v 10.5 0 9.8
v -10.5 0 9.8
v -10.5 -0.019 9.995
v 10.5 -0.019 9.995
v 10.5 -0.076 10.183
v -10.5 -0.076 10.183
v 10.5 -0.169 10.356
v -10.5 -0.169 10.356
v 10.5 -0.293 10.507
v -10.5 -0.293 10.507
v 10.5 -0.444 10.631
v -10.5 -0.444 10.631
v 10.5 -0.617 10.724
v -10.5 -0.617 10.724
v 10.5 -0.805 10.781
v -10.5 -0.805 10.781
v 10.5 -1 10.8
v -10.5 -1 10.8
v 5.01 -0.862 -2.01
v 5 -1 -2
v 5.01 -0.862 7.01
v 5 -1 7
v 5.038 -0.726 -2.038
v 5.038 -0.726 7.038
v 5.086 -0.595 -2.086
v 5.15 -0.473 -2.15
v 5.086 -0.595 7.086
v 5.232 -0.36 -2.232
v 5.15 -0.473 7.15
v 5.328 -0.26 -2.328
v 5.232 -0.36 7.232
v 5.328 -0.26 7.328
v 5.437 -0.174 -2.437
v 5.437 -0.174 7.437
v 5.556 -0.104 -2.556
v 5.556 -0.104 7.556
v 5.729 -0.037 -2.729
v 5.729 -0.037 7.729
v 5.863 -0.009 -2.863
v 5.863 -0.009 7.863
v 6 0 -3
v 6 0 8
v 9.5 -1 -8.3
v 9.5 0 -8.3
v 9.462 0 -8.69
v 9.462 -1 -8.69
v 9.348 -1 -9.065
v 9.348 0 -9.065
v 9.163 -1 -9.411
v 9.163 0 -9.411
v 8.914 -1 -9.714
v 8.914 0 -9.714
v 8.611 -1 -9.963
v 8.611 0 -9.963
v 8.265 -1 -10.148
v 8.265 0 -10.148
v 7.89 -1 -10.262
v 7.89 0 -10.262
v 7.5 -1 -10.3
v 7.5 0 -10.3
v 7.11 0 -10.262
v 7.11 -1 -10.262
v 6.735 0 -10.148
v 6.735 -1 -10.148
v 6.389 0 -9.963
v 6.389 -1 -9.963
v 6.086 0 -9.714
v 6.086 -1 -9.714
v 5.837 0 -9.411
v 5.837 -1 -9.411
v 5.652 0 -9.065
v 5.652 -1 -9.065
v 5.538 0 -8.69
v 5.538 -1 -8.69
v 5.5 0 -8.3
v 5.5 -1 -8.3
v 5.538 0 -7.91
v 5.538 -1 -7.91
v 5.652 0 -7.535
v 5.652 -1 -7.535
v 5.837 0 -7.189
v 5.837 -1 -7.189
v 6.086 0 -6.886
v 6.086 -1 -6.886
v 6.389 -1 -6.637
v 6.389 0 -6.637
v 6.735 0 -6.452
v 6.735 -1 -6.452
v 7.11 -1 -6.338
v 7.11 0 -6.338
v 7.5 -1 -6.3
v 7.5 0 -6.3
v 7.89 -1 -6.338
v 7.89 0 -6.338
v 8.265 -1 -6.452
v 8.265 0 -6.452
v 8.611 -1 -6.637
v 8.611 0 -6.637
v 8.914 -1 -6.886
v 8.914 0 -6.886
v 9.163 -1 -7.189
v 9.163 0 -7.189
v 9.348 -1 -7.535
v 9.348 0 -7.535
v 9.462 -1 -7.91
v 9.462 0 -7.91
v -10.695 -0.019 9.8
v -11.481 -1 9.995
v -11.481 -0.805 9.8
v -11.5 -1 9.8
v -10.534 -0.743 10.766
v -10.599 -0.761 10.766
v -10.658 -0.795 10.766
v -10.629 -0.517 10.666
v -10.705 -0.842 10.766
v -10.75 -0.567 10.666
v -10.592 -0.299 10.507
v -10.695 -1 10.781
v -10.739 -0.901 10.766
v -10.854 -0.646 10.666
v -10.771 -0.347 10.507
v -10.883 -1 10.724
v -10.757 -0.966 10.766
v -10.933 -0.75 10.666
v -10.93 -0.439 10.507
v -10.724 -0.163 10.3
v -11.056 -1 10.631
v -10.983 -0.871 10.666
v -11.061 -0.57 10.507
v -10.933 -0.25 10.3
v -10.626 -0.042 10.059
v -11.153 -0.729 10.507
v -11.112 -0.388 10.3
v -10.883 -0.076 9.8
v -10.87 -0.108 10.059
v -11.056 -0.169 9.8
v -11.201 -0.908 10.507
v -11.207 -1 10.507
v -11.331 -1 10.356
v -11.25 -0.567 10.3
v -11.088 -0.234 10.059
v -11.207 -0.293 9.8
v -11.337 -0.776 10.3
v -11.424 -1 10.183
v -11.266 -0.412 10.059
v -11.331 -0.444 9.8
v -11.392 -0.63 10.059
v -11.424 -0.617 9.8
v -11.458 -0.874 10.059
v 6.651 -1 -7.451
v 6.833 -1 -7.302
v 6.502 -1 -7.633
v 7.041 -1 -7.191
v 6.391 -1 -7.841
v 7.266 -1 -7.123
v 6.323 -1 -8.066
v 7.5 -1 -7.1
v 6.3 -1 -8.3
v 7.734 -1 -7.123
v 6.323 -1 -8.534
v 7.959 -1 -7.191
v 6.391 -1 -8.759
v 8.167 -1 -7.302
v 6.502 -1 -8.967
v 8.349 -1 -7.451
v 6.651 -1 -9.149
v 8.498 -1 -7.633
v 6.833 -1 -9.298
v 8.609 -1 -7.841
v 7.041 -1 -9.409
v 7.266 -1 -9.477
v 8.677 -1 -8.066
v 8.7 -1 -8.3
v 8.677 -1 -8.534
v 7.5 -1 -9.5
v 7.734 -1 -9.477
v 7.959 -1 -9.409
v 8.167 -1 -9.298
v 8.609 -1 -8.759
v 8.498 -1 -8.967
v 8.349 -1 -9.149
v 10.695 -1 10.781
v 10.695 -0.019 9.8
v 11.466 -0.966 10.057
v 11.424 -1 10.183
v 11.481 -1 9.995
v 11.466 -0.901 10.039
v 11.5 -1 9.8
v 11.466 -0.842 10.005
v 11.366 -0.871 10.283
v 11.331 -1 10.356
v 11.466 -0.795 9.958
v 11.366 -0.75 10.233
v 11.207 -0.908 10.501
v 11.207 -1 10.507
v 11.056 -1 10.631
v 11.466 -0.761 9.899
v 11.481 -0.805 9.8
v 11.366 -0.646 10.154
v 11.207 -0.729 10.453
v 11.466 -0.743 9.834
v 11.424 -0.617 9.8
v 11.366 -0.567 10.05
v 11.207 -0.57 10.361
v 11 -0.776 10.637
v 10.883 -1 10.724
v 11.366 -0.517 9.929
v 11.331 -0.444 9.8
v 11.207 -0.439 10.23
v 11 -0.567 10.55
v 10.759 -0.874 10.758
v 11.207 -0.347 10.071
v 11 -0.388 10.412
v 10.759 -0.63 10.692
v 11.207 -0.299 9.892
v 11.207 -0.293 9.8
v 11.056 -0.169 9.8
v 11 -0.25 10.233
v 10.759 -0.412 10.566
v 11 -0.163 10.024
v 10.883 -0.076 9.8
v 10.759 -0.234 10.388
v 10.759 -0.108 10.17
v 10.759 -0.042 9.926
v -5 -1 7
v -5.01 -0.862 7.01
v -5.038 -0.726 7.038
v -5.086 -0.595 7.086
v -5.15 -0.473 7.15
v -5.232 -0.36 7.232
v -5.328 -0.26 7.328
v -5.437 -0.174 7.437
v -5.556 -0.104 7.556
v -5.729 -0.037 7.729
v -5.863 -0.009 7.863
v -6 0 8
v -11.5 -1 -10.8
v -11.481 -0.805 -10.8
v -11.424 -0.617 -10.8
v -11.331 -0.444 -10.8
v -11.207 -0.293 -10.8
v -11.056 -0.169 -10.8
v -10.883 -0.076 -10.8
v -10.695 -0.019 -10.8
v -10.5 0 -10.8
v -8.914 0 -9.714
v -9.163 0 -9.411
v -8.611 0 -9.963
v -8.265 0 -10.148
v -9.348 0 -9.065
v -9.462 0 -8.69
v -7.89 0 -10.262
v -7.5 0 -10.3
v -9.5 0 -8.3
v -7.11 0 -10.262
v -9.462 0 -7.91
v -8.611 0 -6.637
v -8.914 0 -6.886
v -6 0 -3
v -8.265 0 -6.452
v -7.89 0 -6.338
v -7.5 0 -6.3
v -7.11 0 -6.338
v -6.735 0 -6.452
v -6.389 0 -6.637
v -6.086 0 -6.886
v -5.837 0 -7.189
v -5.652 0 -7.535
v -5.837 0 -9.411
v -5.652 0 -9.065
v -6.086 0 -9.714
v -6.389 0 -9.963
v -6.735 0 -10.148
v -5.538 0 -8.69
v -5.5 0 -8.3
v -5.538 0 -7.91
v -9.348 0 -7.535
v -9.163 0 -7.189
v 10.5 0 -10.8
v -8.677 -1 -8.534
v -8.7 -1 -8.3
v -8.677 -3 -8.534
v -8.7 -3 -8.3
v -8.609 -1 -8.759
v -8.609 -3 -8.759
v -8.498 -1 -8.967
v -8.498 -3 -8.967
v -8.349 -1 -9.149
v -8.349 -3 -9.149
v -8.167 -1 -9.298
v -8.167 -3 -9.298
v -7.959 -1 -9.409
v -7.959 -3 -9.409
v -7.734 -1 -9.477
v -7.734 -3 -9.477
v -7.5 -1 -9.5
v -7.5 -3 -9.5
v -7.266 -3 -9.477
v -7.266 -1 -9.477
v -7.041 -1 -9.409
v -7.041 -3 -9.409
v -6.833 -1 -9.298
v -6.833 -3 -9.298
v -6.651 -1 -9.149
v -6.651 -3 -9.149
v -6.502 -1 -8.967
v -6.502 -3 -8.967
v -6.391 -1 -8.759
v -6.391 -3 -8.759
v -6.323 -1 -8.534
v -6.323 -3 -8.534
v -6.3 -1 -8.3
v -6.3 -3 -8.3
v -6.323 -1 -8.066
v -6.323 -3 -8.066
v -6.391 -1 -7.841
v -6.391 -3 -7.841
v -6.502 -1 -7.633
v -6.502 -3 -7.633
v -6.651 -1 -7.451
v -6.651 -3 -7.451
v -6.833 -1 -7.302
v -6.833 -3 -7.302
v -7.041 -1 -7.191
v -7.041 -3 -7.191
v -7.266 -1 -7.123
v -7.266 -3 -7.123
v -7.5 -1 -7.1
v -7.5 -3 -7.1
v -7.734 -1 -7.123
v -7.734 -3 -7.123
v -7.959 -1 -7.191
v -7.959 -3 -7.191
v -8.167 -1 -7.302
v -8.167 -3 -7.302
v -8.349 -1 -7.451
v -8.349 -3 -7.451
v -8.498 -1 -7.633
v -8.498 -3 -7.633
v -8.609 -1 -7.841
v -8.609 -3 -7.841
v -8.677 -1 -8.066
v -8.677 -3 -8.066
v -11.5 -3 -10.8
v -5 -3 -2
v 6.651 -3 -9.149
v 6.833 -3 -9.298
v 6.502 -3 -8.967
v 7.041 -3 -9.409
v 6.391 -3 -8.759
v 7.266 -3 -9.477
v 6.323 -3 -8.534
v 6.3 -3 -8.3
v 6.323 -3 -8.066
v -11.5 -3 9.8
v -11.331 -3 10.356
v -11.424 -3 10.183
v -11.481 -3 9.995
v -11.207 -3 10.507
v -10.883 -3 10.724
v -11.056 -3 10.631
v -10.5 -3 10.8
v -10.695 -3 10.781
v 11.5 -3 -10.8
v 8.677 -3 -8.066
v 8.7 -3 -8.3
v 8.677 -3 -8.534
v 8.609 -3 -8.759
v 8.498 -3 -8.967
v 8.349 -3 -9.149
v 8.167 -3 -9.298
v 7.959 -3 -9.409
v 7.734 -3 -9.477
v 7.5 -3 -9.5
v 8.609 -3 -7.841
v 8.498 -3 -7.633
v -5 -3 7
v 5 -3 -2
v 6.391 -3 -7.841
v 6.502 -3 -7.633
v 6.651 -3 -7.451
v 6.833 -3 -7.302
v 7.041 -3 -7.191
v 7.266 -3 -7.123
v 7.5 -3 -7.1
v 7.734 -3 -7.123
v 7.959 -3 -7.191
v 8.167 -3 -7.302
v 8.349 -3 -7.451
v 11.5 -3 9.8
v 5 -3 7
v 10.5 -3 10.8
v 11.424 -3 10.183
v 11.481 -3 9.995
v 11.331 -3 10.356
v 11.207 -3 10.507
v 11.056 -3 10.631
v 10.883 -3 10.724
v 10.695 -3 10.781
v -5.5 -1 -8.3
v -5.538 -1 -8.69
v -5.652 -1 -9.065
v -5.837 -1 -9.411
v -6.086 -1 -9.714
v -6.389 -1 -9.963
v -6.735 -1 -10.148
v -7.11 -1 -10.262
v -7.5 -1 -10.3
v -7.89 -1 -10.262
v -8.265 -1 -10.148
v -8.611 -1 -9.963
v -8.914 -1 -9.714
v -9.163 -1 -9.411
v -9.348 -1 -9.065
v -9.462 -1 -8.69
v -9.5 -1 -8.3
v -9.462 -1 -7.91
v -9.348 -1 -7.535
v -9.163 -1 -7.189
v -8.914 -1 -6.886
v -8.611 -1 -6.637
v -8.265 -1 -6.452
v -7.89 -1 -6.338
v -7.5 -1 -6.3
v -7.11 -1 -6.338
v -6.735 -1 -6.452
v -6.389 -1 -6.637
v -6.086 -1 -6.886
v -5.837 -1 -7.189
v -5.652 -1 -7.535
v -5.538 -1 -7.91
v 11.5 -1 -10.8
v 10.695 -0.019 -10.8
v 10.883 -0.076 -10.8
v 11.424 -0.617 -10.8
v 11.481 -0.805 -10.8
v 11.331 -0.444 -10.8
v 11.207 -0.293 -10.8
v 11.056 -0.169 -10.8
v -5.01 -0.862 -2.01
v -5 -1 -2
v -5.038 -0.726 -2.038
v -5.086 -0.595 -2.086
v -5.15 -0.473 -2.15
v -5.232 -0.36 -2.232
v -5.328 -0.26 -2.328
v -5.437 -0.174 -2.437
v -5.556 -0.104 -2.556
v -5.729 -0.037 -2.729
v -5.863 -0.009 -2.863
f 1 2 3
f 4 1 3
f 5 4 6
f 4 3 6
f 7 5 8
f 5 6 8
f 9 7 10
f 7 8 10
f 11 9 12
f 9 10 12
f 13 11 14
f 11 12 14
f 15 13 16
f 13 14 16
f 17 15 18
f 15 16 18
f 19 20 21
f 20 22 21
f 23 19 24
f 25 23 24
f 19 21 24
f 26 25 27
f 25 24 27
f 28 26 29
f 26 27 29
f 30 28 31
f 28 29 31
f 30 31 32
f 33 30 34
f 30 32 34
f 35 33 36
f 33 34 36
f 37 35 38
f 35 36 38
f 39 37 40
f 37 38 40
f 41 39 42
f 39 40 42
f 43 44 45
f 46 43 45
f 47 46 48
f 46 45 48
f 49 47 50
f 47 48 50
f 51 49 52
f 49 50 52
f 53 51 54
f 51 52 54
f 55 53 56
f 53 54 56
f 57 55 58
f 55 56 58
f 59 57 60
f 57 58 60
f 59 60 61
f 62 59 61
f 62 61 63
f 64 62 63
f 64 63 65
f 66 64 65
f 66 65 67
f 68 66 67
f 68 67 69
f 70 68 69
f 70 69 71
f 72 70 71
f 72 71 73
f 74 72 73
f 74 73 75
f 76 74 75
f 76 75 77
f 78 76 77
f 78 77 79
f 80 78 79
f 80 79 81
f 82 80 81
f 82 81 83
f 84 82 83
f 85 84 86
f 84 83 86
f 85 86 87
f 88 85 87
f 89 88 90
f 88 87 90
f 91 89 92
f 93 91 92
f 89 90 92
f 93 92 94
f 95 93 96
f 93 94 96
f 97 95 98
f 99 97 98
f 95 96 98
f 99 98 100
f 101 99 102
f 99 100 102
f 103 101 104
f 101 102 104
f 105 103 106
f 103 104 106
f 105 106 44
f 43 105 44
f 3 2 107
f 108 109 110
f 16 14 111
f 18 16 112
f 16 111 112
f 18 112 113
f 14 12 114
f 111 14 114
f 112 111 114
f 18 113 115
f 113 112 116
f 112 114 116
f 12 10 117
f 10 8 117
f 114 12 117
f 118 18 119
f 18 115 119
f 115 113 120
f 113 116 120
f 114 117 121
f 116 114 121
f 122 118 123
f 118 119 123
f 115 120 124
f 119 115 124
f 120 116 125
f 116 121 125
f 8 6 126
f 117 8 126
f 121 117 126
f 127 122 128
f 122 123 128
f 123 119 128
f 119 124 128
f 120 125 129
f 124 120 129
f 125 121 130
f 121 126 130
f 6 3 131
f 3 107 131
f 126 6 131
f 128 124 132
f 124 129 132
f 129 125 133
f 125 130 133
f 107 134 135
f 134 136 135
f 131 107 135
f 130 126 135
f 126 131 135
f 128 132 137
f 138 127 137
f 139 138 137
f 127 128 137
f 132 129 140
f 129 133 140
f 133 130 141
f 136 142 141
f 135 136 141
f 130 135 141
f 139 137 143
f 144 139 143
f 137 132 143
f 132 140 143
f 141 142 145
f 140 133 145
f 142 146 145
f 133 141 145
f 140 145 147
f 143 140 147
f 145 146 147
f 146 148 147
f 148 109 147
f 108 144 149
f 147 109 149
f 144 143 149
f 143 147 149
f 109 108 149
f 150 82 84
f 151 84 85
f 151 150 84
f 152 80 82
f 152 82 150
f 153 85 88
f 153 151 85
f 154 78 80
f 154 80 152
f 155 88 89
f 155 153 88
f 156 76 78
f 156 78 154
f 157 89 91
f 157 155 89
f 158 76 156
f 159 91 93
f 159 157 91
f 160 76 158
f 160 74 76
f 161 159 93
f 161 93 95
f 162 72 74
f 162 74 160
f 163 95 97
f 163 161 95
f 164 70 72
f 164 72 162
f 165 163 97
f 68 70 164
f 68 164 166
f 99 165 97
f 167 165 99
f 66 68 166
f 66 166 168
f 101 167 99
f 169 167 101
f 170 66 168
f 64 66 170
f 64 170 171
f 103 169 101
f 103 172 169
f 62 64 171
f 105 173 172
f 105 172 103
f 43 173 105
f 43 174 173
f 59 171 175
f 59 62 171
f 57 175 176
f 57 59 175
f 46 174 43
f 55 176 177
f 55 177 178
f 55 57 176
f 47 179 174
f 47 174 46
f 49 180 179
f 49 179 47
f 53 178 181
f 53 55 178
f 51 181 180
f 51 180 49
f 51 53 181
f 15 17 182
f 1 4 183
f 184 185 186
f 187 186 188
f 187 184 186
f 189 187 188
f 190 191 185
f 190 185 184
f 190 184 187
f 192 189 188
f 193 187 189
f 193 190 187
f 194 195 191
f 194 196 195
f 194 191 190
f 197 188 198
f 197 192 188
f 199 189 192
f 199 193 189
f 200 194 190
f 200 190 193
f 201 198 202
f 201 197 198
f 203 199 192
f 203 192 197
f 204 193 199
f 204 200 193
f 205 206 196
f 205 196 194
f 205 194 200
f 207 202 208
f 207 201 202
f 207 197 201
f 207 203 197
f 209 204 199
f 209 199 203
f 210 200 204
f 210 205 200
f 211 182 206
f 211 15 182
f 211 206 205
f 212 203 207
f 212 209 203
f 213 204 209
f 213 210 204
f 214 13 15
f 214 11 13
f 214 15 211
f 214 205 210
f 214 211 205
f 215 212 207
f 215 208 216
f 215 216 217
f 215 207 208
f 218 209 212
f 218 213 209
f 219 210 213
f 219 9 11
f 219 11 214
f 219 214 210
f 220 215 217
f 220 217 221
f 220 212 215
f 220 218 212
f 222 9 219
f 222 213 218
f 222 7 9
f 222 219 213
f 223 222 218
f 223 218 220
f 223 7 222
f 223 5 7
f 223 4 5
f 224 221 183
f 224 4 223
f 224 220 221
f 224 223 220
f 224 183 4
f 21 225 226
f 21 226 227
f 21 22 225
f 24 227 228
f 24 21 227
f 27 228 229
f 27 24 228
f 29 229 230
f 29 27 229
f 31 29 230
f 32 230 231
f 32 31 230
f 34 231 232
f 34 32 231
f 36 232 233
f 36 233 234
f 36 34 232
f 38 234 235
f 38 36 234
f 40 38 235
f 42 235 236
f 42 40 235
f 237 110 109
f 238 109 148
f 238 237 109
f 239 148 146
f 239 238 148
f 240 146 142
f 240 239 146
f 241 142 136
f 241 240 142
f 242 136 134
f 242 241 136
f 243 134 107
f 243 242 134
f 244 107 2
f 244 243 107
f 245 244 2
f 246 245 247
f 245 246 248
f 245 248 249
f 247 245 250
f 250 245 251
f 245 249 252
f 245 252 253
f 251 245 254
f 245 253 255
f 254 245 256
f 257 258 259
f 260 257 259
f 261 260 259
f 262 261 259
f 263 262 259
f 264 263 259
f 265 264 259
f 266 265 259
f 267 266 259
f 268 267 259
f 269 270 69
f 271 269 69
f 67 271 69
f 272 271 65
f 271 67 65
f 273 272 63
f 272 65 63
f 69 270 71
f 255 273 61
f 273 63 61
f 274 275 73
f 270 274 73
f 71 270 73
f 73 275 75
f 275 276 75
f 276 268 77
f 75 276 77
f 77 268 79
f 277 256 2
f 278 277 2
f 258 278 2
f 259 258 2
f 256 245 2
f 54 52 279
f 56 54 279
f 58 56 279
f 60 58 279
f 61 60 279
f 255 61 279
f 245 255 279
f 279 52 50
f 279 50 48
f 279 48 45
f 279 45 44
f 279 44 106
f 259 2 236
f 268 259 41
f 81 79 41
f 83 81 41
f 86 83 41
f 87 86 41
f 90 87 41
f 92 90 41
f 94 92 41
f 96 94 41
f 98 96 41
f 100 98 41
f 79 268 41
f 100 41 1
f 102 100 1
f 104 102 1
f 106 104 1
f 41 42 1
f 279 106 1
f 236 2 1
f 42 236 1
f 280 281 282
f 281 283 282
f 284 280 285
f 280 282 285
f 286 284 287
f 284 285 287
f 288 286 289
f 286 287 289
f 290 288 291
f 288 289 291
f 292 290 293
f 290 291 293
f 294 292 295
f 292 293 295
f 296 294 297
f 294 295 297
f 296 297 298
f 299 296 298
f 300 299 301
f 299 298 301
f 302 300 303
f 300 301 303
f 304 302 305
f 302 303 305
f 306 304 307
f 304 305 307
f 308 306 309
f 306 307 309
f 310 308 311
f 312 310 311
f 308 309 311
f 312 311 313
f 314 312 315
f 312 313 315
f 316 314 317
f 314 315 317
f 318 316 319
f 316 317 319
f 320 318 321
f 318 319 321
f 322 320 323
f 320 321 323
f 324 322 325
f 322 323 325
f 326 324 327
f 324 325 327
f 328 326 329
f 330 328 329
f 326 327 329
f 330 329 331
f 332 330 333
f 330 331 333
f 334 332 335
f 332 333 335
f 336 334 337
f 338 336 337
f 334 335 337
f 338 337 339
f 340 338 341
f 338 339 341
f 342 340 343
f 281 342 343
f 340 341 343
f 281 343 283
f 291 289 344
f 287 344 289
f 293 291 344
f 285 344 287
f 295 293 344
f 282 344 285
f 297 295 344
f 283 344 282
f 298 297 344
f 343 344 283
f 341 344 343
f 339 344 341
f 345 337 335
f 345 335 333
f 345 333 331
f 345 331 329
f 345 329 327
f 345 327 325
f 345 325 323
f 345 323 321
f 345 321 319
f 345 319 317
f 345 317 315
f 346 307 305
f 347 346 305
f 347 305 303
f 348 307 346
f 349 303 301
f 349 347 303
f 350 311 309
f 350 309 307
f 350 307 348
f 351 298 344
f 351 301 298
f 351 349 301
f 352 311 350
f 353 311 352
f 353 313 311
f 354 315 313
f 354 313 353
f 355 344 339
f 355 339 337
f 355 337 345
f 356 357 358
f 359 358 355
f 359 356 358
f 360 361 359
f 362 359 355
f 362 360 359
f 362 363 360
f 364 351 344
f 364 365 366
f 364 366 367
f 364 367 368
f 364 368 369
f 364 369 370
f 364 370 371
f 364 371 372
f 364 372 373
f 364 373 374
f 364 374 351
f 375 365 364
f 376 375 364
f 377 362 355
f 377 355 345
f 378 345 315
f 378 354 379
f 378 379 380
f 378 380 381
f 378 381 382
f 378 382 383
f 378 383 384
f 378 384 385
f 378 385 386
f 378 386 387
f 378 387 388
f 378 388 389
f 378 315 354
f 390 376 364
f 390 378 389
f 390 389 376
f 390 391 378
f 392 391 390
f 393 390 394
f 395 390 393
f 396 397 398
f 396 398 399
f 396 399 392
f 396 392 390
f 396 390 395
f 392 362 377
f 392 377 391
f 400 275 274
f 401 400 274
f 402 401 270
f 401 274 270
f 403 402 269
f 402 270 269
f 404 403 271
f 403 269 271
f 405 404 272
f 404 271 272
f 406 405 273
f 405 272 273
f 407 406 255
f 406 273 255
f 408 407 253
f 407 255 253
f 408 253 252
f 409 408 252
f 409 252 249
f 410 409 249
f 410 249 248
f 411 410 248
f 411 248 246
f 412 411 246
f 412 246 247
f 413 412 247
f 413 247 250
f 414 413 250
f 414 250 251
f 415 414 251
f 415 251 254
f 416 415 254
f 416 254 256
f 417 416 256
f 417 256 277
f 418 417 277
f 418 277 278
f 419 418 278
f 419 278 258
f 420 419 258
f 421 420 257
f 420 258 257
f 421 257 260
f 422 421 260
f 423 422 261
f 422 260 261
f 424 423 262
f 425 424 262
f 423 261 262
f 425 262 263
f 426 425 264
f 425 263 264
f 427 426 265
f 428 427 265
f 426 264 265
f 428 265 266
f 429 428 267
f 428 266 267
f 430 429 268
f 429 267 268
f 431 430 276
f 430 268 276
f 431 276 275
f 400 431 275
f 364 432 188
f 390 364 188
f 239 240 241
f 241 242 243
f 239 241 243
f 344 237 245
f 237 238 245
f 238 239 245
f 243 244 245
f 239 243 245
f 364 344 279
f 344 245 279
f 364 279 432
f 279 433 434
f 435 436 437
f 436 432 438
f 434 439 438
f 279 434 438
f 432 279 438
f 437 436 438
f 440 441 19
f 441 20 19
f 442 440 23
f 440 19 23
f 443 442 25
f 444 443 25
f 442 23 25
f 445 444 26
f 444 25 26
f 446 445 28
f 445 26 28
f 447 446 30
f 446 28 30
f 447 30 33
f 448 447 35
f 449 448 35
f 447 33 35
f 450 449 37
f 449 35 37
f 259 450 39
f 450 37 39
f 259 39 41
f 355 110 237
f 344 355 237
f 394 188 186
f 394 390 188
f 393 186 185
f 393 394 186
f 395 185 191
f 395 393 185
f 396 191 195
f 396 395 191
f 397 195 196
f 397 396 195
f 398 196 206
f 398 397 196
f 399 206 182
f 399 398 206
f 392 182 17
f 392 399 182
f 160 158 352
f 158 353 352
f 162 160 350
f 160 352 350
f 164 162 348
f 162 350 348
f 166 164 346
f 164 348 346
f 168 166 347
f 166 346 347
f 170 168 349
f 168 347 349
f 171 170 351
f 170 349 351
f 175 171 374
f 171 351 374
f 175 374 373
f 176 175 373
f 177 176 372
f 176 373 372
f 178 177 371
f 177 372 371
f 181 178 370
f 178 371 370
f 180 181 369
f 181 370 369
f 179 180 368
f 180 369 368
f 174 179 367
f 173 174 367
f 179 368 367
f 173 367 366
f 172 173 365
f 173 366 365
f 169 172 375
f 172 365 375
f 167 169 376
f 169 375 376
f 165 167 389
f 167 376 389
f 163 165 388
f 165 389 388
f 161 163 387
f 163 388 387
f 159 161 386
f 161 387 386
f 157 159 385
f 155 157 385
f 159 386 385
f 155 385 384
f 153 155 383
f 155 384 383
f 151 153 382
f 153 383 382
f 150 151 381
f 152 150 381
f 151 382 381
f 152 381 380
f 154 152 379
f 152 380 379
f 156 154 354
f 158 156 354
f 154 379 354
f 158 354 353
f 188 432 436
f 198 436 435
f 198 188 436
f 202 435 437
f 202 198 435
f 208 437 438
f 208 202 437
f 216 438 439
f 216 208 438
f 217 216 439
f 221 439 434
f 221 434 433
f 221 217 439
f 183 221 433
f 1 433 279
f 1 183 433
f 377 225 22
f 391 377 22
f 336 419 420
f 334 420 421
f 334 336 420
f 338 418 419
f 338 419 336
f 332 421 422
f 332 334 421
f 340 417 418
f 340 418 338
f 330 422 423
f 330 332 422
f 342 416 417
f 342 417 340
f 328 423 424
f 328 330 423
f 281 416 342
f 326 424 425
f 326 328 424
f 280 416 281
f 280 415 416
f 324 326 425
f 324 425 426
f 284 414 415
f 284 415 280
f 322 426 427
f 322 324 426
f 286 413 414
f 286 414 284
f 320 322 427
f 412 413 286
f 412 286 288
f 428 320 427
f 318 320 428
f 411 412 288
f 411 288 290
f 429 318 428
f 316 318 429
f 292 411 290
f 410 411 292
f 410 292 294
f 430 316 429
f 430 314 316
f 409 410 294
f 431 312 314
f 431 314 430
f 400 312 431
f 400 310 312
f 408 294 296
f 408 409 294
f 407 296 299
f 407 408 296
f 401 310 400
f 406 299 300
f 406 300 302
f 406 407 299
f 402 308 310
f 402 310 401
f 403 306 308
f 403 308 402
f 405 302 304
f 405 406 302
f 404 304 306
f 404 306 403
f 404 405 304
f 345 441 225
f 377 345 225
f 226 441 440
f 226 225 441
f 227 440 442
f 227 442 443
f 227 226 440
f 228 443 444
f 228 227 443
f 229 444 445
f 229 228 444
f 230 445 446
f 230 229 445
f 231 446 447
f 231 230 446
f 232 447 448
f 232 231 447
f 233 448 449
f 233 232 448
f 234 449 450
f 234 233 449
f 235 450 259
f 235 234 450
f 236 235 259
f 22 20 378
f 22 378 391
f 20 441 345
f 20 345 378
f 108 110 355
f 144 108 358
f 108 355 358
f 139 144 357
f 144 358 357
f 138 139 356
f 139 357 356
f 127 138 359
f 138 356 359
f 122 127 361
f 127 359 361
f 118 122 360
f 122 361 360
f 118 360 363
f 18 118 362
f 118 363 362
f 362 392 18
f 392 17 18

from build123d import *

# Parameters (mm, degrees)
F0_W           = 6.5
F0_H           = 5
F0_W_2         = 10
F0_H_2         = 9
F1_DEPTH       = 3
F2_D           = 2.4
F2_DEPTH       = 3
F2_CBORE_D     = 4
F2_CBORE_DEPTH = 1
F2_TIP         = 0.7210327428
F3_R           = 1


# Not quite as in the source:
# - a feature names something its author has since deleted; it is built from what else it names


with BuildPart() as f1:
    # F0 (on Front) → F1 (new body)
    with BuildSketch(Plane.XZ):
        with Locations((8.25, -8.3)):
            Rectangle(F0_W, F0_H)
        with Locations((0, -8.3)):
            Rectangle(F0_W_2, F0_H)
        with Locations((-8.25, -8.3)):
            Rectangle(F0_W, F0_H)
        Polygon((5, -5.8), (11.5, -5.8), (11.5, 10.8), (-11.5, 10.8), (-11.5, -5.8), (-5, -5.8), align=None)
        with Locations((0, 2.5)):
            Rectangle(F0_W_2, F0_H_2, mode=Mode.SUBTRACT)
    extrude(amount=F1_DEPTH)

    # F2
    with Locations(Plane(origin=(0, 0, 0), x_dir=(1, 0, 0), z_dir=(0, 1, 0))):
        with Locations((7.5, 8.3), (-7.5, 8.3)):
            CounterBoreHole(F2_D / 2, F2_CBORE_D / 2, F2_CBORE_DEPTH, depth=F2_DEPTH)
            with Locations((0, 0, -(F2_DEPTH + F2_TIP / 2))):  # 118° drill point
                Cone(0, F2_D / 2, F2_TIP, mode=Mode.SUBTRACT)

    # F3
    f3_edges = [f1.edges().sort_by_distance(p)[0] for p in [
        (-11.5, 0, 0),
        (0, 0, 10.8),
        (11.5, -1.5, 10.8),
        (-11.5, -1.5, 10.8),
        (11.5, 0, 0),
        (-5, 0, 2.5),
        (0, 0, 7),
        (5, 0, 2.5),
        (0, 0, -2),
    ]]
    fillet(f3_edges, radius=F3_R)


solid = f1.part
